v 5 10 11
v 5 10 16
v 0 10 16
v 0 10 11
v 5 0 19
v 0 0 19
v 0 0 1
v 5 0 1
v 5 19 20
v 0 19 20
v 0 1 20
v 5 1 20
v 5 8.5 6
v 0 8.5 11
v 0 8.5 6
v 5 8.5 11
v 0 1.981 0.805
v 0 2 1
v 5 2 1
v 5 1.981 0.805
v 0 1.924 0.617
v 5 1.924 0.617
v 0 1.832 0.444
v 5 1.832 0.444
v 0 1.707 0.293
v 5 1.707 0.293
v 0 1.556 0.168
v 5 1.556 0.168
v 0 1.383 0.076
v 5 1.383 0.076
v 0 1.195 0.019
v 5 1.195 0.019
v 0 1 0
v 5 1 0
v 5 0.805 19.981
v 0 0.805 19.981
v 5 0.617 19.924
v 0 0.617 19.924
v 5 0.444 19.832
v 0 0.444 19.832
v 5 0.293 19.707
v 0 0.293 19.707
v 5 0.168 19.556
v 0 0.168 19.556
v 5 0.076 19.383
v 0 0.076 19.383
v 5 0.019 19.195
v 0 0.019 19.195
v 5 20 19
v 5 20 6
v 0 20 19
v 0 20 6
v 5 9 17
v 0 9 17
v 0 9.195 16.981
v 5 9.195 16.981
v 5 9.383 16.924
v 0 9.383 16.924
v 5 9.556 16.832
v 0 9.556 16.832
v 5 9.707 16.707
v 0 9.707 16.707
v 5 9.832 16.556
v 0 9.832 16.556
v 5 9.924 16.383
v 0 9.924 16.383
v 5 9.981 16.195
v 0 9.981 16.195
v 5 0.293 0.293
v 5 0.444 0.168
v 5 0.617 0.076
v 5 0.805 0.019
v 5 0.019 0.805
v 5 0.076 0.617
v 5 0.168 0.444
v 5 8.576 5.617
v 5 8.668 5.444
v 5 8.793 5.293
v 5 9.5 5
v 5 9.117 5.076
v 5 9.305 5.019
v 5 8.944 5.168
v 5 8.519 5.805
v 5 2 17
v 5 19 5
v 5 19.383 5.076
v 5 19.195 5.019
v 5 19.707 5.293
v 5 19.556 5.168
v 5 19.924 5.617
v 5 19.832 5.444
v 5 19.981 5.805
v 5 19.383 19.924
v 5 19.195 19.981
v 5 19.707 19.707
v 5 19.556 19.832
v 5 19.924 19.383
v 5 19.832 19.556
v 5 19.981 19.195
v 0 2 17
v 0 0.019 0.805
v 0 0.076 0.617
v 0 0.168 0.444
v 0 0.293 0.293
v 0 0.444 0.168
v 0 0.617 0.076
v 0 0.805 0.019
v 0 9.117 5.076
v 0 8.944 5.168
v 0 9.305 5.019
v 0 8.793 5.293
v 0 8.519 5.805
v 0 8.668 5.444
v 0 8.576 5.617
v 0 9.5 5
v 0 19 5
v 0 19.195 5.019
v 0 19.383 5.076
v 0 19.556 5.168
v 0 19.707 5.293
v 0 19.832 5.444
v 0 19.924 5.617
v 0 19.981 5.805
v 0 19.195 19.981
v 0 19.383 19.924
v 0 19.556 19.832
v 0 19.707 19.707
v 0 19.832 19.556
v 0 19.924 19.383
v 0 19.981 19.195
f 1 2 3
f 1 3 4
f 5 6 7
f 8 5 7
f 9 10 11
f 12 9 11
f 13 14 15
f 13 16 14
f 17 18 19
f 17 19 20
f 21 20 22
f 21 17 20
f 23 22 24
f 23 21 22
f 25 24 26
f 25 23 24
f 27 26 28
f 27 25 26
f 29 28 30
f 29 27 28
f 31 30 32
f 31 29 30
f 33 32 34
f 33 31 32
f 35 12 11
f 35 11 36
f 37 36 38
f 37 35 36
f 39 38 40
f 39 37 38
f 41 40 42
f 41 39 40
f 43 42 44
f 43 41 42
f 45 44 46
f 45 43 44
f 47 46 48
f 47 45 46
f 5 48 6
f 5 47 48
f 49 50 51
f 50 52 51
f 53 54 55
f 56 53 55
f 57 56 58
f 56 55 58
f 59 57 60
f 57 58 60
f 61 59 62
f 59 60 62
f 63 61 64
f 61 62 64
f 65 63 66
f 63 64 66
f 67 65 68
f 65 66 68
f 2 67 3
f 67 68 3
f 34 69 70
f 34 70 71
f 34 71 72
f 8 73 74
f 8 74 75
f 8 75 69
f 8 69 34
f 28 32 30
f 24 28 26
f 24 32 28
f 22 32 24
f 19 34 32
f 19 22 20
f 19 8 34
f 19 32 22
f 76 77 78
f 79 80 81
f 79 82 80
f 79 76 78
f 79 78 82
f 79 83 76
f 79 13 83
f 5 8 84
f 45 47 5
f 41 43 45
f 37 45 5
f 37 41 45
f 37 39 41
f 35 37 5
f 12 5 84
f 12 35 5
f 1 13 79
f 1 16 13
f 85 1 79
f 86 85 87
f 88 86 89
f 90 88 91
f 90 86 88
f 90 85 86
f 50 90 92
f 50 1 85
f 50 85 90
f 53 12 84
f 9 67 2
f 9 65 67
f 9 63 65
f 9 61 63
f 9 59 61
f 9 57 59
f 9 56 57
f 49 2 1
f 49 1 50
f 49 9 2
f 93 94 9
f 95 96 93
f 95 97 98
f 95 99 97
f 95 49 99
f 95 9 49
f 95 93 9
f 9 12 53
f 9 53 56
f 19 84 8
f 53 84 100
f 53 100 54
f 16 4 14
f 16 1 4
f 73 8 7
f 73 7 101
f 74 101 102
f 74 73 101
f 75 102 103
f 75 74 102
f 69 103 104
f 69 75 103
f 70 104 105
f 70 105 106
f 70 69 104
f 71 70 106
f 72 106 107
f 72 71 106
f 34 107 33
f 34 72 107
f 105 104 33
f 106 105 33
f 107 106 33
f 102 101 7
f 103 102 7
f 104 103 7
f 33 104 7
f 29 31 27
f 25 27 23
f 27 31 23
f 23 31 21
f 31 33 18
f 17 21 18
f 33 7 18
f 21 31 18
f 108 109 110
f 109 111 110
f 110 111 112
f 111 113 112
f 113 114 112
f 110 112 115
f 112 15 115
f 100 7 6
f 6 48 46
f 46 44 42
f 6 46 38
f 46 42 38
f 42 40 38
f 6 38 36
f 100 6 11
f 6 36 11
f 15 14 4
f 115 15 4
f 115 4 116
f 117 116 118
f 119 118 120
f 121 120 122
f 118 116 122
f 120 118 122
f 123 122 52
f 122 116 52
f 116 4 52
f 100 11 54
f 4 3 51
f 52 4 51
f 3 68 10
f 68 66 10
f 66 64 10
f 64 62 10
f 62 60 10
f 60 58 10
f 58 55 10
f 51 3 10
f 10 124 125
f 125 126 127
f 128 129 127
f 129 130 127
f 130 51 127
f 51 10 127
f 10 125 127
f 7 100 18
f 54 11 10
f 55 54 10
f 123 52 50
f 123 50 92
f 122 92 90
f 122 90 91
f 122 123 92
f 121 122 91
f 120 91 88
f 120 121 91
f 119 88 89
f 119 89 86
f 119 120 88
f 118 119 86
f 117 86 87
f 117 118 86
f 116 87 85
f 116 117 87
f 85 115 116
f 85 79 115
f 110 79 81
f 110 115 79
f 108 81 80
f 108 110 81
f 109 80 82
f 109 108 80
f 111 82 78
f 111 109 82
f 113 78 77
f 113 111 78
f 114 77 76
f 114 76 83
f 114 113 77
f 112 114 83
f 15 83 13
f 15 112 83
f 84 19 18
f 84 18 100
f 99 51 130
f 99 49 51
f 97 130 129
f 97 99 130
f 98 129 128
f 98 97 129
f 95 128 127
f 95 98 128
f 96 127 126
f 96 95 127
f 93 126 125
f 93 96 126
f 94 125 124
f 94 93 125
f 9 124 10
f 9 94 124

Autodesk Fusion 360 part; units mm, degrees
sketch "Sketch3" plane through (0, 0, 0) normal (1, 0, 0) x (0, 1, 0)
  line L0 (0, 0) -> (20, 0)
  line L1 (20, 0) -> (20, 20)
  line L2 (20, 20) -> (0, 20)
  line L3 (0, 20) -> (0, 0)
  dimension "d24" = 20
  dimension "d27" = 20
extrude "Extrude3" add sketch "Sketch3" along normal blind 5
sketch "Sketch4" plane through (5, 0, 0) normal (1, 0, 0) x (0, 1, 0)
  line L0 (0, 20) -> (0, 0)
  line L1 (0, 0) -> (20, 0)
  line L2 (20, 0) -> (20, 20)
  line L3 (20, 20) -> (0, 20)
  line L4 (2, 0) -> (2, 17)
  line L5 (2, 17) -> (10, 17)
  line L6 (10, 17) -> (10, 11)
  line L7 (10, 11) -> (8.5, 11)
  line L8 (8.5, 11) -> (8.5, 5)
  line L9 (8.5, 5) -> (20, 5)
  line L10 (20, 0) -> (2, 0)
  line L11 (20, 0) -> (20, 5)
  dimension "d30" = 8
  dimension "d31" = 2
  dimension "d32" = 6.5
  dimension "d33" = 12
  dimension "d35" = 6
  dimension "d36" = 5
extrude "Extrude4" cut sketch "Sketch4" against normal through all contours L1 L2 L4 L5 L6 L7 L8 L9 L10 L11
fillet "Fillet1" radius 1 7 edges at (2.5, 8.5, 5) (2.5, 10, 17) (2.5, 20, 5) (2.5, 20, 20) (2.5, 0, 20) (2.5, 0, 0) (2.5, 2, 0)
